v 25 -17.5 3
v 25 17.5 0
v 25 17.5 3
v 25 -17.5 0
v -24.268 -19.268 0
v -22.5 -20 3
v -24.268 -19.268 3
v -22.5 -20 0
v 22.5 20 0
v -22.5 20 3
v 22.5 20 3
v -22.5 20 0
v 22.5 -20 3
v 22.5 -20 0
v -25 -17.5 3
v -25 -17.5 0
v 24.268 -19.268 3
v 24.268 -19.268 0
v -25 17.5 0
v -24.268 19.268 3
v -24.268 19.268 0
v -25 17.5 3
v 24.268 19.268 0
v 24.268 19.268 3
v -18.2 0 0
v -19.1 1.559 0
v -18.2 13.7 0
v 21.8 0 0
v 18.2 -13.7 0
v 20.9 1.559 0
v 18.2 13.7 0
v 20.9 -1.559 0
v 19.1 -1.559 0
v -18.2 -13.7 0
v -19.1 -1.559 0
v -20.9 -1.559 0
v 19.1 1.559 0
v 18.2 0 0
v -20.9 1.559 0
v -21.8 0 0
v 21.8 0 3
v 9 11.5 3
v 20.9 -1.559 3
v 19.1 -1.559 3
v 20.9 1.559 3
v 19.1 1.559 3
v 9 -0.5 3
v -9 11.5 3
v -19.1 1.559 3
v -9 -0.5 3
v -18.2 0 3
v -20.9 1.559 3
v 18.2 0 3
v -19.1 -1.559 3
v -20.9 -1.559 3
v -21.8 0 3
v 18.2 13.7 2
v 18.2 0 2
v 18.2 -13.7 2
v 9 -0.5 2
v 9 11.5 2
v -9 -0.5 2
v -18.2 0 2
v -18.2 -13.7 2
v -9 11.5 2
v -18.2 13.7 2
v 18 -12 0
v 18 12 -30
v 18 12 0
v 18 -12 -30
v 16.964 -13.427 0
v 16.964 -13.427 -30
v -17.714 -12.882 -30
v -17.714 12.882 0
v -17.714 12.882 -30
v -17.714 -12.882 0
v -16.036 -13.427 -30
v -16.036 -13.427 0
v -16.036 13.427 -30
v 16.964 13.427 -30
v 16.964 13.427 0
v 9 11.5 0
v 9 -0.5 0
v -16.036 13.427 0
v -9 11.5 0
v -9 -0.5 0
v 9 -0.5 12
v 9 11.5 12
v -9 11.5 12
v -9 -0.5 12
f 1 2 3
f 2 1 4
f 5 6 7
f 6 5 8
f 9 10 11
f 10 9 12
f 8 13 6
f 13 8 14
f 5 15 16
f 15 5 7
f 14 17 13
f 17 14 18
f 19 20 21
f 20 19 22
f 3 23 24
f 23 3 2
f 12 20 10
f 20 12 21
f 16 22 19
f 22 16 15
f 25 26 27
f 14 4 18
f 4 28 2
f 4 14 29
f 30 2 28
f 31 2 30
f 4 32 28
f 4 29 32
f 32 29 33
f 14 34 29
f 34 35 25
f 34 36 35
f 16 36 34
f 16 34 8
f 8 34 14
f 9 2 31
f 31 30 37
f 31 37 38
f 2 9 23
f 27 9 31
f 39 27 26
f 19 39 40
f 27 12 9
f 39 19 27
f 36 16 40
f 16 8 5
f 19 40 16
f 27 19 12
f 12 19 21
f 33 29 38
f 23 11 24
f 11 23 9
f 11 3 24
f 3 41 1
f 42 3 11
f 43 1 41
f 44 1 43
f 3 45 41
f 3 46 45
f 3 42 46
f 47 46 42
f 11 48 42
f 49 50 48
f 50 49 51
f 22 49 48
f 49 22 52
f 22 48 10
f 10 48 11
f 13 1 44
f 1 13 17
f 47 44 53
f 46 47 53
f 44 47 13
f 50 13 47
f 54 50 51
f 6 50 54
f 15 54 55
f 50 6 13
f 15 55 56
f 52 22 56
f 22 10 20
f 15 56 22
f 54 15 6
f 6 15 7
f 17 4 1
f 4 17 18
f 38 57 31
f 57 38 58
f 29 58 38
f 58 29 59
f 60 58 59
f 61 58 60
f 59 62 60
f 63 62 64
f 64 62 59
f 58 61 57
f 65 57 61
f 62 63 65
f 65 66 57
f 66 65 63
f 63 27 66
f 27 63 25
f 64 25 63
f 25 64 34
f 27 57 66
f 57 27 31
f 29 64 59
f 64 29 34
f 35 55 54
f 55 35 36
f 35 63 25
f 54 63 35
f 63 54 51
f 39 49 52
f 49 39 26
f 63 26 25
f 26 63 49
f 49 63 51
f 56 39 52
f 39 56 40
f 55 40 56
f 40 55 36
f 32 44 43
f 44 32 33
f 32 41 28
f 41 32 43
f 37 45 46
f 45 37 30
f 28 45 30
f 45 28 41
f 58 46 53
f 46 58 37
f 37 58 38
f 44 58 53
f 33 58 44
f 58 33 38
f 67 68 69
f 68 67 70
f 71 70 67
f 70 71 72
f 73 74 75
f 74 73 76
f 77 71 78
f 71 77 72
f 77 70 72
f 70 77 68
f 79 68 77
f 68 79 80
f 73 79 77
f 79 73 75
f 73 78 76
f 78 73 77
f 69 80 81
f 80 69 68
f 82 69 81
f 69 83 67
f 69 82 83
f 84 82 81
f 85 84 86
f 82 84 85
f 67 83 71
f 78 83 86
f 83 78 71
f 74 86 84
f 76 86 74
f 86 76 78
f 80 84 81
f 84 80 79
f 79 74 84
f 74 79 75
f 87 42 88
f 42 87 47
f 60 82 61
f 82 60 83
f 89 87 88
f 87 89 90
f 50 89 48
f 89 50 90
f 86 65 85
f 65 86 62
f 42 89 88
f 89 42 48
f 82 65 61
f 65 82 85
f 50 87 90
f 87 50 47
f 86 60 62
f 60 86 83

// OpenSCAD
// Parameters
cutout_width_mm = 36; //[18:72:0.1]
cutout_height_mm = 27; //[13.5:54:0.1]
panel_thickness_mm = 2; //[1:4:0.1]
flange_width_mm = 50; //[35:80:0.1]
flange_height_mm = 40; //[30:70:0.1]
flange_thickness_mm = 3; //[1.5:6:0.1]
bezel_radius_mm = 2.5; //[1:6:0.1]
corner_radius_mm = 1.5; //[0.5:4:0.1]
screw_hole_diameter_mm = 3.2; //[2.4:5:0.1]
screw_hole_pitch_x_mm = 40; //[28:60:0.1]
screw_hole_pitch_y_mm = 0; //[0:20:0.1]
body_depth_mm = 30; //[20:60:0.1]
fuse_drawer_projection_mm = 8; //[4:16:0.1]
terminal_clearance_depth_mm = 12; //[6:25:0.1]
tolerance_mm = 0.2; //[0:0.8:0.05]
overlap_mm = 1; //[0.5:2:0.1]
body_wall_mm = 2; //[1:4:0.1]
fuse_drawer_width_mm = 18; //[12:28:0.1]
fuse_drawer_height_mm = 12; //[8:20:0.1]
fuse_drawer_depth_mm = 16; //[10:30:0.1]
spade_clearance_width_mm = 26; //[18:40:0.1]
spade_clearance_height_mm = 18; //[12:30:0.1]

// IEC Inlet Module
module iec() {
  color("Black") {
    // Front Flange Bezel
    difference() {
      hull() {
        translate([flange_width_mm/2 - bezel_radius_mm, flange_height_mm/2 - bezel_radius_mm, panel_thickness_mm/2 + flange_thickness_mm/2 - overlap_mm])
          cylinder(r=bezel_radius_mm, h=flange_thickness_mm, center=true);
        translate([-flange_width_mm/2 + bezel_radius_mm, flange_height_mm/2 - bezel_radius_mm, panel_thickness_mm/2 + flange_thickness_mm/2 - overlap_mm])
          cylinder(r=bezel_radius_mm, h=flange_thickness_mm, center=true);
        translate([flange_width_mm/2 - bezel_radius_mm, -flange_height_mm/2 + bezel_radius_mm, panel_thickness_mm/2 + flange_thickness_mm/2 - overlap_mm])
          cylinder(r=bezel_radius_mm, h=flange_thickness_mm, center=true);
        translate([-flange_width_mm/2 + bezel_radius_mm, -flange_height_mm/2 + bezel_radius_mm, panel_thickness_mm/2 + flange_thickness_mm/2 - overlap_mm])
          cylinder(r=bezel_radius_mm, h=flange_thickness_mm, center=true);
        translate([0, 0, panel_thickness_mm/2 + flange_thickness_mm/2 - overlap_mm])
          cube([flange_width_mm - 2*bezel_radius_mm, flange_height_mm - 2*bezel_radius_mm, flange_thickness_mm], center=true);
      }
      translate([0, 0, 0])
        cube([cutout_width_mm + 2*tolerance_mm, cutout_height_mm + 2*tolerance_mm, panel_thickness_mm + 2*overlap_mm], center=true);
      translate([-screw_hole_pitch_x_mm/2, screw_hole_pitch_y_mm/2, panel_thickness_mm/2 + flange_thickness_mm/2 - overlap_mm])
        cylinder(r=screw_hole_diameter_mm/2 + tolerance_mm, h=flange_thickness_mm + panel_thickness_mm + 4*overlap_mm, center=true);
      translate([screw_hole_pitch_x_mm/2, -screw_hole_pitch_y_mm/2, panel_thickness_mm/2 + flange_thickness_mm/2 - overlap_mm])
        cylinder(r=screw_hole_diameter_mm/2 + tolerance_mm, h=flange_thickness_mm + panel_thickness_mm + 4*overlap_mm, center=true);
    }
  }
}

// Mod Component
module mod() {
  color("DimGray") {
    // IEC Inlet Body
    hull() {
      translate([cutout_width_mm/2 - corner_radius_mm, cutout_height_mm/2 - corner_radius_mm, -panel_thickness_mm/2 - body_depth_mm/2 + overlap_mm])
        cylinder(r=corner_radius_mm, h=body_depth_mm, center=true);
      translate([-cutout_width_mm/2 + corner_radius_mm, cutout_height_mm/2 - corner_radius_mm, -panel_thickness_mm/2 - body_depth_mm/2 + overlap_mm])
        cylinder(r=corner_radius_mm, h=body_depth_mm, center=true);
      translate([cutout_width_mm/2 - corner_radius_mm, -cutout_height_mm/2 + corner_radius_mm, -panel_thickness_mm/2 - body_depth_mm/2 + overlap_mm])
        cylinder(r=corner_radius_mm, h=body_depth_mm, center=true);
      translate([-cutout_width_mm/2 + corner_radius_mm, -cutout_height_mm/2 + corner_radius_mm, -panel_thickness_mm/2 - body_depth_mm/2 + overlap_mm])
        cylinder(r=corner_radius_mm, h=body_depth_mm, center=true);
      translate([0, 0, -panel_thickness_mm/2 - body_depth_mm/2 + overlap_mm])
        cube([cutout_width_mm - 2*corner_radius_mm, cutout_height_mm - 2*corner_radius_mm, body_depth_mm], center=true);
    }
    // Fuse Drawer Housing
    translate([0, cutout_height_mm/2 - fuse_drawer_height_mm/2 - body_wall_mm, panel_thickness_mm/2 + flange_thickness_mm + fuse_drawer_projection_mm - fuse_drawer_depth_mm/2])
      cube([fuse_drawer_width_mm, fuse_drawer_height_mm, fuse_drawer_depth_mm], center=true);
  }
}

// Assembly
module assembly() {
  iec();
  mod();
}

assembly();
